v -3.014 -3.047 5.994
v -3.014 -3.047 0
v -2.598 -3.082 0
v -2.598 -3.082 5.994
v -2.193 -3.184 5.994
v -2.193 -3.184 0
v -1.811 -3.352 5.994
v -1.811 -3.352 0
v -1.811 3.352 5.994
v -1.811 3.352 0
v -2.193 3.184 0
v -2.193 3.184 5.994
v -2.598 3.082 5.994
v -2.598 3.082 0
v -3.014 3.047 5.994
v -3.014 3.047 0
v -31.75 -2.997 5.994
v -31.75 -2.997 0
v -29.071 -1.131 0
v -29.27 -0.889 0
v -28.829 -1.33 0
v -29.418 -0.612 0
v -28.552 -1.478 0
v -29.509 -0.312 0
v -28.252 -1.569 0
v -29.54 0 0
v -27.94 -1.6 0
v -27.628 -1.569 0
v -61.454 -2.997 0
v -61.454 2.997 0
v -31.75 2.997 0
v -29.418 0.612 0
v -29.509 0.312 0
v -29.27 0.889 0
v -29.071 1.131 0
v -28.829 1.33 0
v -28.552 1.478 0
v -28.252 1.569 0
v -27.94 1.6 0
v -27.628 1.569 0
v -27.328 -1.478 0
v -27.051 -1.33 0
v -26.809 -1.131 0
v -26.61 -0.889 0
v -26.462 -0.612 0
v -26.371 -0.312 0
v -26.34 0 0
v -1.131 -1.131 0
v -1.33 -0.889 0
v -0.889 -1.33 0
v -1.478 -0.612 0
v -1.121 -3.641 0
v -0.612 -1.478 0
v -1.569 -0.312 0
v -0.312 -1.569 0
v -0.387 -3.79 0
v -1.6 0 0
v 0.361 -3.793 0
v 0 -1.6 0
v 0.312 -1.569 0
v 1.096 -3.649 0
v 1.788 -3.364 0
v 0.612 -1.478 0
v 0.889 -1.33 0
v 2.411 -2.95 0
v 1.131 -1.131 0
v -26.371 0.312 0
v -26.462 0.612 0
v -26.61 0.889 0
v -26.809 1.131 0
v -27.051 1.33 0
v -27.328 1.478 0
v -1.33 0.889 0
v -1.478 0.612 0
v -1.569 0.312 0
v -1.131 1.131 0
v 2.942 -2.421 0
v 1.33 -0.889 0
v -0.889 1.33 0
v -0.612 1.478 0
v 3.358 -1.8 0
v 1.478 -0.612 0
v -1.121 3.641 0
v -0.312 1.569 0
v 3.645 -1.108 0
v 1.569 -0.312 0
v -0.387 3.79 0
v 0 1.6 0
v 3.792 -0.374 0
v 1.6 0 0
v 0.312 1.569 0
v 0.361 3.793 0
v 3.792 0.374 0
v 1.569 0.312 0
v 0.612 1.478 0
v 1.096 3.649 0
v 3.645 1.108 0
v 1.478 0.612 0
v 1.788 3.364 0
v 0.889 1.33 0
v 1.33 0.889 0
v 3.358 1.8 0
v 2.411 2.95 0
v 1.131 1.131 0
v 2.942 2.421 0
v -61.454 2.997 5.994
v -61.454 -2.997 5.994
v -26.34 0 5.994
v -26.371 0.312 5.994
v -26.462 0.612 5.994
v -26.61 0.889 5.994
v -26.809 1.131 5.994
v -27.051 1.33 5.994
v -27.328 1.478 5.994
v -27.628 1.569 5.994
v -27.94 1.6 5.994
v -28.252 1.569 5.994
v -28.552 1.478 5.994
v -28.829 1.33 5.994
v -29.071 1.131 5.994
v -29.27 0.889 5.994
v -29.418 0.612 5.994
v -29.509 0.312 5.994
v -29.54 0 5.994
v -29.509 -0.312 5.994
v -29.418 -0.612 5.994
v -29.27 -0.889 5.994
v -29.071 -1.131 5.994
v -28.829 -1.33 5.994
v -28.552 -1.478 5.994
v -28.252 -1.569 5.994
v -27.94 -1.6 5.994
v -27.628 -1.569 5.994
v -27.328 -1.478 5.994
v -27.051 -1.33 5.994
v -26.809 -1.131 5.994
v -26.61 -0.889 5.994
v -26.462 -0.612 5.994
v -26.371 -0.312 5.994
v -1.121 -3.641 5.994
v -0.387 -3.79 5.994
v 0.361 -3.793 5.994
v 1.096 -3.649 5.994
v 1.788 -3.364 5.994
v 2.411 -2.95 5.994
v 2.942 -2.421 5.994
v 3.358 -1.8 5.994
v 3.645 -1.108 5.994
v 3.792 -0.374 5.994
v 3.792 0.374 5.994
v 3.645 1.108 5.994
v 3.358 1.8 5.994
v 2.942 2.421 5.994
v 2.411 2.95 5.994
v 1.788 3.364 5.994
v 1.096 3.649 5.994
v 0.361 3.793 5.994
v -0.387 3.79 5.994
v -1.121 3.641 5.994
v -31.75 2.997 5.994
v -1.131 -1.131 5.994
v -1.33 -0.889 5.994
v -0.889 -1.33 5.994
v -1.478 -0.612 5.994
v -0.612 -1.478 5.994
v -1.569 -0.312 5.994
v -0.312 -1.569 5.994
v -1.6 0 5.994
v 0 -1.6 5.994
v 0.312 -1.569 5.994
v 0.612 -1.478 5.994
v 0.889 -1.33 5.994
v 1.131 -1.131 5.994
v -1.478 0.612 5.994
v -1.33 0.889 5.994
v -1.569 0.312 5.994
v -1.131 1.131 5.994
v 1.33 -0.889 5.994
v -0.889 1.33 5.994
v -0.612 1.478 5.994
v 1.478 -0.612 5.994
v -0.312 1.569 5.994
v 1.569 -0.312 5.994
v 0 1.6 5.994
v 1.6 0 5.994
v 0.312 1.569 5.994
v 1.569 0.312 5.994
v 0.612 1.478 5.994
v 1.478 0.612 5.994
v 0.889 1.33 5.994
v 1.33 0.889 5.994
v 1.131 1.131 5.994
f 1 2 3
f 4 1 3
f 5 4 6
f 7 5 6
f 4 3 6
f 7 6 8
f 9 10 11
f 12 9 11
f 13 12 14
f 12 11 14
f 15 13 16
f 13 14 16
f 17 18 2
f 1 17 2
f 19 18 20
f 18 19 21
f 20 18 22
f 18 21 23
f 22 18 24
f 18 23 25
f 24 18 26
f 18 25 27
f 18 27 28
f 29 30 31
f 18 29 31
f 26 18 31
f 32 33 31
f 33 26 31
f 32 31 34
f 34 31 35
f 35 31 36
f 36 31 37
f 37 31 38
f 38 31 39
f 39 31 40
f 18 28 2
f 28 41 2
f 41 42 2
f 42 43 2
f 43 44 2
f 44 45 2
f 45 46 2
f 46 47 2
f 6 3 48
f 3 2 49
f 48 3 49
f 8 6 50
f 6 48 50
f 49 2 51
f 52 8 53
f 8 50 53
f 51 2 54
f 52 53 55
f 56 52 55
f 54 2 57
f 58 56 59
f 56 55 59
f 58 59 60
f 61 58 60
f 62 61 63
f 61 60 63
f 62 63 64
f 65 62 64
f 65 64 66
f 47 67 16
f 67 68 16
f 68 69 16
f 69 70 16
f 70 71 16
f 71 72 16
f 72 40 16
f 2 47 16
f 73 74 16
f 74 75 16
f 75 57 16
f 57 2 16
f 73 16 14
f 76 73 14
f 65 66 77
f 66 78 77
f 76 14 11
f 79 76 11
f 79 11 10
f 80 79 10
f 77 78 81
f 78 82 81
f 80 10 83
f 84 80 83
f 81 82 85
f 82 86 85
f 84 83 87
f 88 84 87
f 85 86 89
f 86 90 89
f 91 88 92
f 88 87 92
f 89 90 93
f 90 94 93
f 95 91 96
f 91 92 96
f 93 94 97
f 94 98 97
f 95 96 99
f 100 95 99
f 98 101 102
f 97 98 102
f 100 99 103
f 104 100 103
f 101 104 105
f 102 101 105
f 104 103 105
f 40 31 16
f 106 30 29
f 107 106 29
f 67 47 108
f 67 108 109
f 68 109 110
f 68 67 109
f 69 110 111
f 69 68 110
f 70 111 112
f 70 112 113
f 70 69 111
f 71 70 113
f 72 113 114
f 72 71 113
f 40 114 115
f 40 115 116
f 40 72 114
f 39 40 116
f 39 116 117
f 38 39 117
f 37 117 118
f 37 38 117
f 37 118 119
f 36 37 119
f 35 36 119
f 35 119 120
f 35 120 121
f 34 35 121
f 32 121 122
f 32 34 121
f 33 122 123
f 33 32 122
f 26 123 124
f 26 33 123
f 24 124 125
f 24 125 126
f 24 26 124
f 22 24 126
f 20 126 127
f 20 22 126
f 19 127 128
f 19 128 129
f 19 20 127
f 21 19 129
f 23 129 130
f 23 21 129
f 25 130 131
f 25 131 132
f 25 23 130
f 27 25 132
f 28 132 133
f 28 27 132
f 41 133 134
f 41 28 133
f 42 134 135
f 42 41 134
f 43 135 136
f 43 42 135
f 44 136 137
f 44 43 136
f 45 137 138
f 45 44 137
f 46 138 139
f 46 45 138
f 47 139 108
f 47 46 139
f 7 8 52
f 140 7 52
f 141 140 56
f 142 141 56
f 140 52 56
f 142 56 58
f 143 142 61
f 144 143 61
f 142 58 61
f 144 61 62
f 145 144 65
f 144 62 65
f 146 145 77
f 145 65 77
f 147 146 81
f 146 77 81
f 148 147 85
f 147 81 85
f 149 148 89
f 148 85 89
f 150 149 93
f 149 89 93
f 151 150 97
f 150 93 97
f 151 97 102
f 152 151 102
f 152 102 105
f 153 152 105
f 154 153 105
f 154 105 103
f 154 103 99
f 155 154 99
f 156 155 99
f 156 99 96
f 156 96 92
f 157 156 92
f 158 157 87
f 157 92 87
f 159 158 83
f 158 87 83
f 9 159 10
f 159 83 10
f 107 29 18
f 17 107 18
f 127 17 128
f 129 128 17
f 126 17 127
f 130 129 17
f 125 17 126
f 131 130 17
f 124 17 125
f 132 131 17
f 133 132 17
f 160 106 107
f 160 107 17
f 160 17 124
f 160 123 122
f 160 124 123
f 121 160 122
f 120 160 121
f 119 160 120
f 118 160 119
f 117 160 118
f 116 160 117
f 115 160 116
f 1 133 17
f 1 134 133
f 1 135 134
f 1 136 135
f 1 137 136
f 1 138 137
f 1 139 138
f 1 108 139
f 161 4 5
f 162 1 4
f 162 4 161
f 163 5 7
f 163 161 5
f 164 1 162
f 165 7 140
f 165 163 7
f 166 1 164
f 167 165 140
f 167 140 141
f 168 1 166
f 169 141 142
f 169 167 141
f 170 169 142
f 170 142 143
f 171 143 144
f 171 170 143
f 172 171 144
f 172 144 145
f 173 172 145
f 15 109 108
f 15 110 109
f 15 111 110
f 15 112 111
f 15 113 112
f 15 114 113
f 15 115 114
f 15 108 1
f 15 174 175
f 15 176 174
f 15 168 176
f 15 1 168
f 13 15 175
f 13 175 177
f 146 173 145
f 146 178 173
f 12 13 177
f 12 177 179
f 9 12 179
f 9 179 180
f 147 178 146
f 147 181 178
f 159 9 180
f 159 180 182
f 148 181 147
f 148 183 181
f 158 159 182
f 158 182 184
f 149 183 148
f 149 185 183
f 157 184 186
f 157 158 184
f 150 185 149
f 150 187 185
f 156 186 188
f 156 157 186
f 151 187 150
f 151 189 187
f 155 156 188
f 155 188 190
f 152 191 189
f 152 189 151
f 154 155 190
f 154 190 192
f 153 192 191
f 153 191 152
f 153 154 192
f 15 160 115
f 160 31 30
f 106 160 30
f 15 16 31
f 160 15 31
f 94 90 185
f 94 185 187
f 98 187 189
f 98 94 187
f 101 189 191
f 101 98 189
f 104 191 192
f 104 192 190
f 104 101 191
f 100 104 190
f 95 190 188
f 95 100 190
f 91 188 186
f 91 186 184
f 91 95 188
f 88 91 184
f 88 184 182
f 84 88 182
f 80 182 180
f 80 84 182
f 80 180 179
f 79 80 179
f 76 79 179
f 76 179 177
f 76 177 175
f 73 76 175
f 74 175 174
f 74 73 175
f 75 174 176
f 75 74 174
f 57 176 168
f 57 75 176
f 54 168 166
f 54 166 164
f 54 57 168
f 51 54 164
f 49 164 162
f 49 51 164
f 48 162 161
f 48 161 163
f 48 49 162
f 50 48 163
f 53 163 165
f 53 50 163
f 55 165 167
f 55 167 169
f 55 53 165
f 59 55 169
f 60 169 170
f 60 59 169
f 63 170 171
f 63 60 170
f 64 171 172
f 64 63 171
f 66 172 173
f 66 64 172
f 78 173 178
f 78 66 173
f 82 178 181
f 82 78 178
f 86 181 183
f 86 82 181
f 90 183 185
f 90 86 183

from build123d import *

# Parameters (mm, degrees)
SKETCH1_R           = 1.6
BOSS_EXTRUDE1_DEPTH = 5.9944


with BuildPart() as part:
    # Sketch1 → Boss-Extrude1 (new body)
    with BuildSketch(Plane.XY):
        with BuildLine():
            Line((-3.01403503, 3.046744767), (-31.75, 2.9972))
            Line((-31.75, 2.9972), (-37.7444, 2.9972))
            Line((-37.7444, 2.9972), (-42.403721744, 2.9972))
            Line((-42.403721744, 2.9972), (-61.453721744, 2.9972))
            Line((-61.453721744, 2.9972), (-61.453721744, -2.9972))
            Line((-61.453721744, -2.9972), (-55.103721744, -2.9972))
            Line((-55.103721744, -2.9972), (-42.403721744, -2.9972))
            Line((-42.403721744, -2.9972), (-37.7444, -2.9972))
            Line((-37.7444, -2.9972), (-31.75, -2.9972))
            Line((-31.75, -2.9972), (-3.01403503, -3.046744767))
            ThreePointArc((-3.01403503, -3.046744767), (-2.393607559, -3.124787196), (-1.8110486, -3.352044595))
            ThreePointArc((-1.8110486, -3.352044595), (3.81, 0), (-1.8110486, 3.352044595))
            ThreePointArc((-1.8110486, 3.352044595), (-2.393607559, 3.124787196), (-3.01403503, 3.046744767))
        make_face()
        with Locations((-27.94, 0)):
            Circle(SKETCH1_R, mode=Mode.SUBTRACT)
        Circle(SKETCH1_R, mode=Mode.SUBTRACT)
    extrude(amount=BOSS_EXTRUDE1_DEPTH)


solid = part.part
